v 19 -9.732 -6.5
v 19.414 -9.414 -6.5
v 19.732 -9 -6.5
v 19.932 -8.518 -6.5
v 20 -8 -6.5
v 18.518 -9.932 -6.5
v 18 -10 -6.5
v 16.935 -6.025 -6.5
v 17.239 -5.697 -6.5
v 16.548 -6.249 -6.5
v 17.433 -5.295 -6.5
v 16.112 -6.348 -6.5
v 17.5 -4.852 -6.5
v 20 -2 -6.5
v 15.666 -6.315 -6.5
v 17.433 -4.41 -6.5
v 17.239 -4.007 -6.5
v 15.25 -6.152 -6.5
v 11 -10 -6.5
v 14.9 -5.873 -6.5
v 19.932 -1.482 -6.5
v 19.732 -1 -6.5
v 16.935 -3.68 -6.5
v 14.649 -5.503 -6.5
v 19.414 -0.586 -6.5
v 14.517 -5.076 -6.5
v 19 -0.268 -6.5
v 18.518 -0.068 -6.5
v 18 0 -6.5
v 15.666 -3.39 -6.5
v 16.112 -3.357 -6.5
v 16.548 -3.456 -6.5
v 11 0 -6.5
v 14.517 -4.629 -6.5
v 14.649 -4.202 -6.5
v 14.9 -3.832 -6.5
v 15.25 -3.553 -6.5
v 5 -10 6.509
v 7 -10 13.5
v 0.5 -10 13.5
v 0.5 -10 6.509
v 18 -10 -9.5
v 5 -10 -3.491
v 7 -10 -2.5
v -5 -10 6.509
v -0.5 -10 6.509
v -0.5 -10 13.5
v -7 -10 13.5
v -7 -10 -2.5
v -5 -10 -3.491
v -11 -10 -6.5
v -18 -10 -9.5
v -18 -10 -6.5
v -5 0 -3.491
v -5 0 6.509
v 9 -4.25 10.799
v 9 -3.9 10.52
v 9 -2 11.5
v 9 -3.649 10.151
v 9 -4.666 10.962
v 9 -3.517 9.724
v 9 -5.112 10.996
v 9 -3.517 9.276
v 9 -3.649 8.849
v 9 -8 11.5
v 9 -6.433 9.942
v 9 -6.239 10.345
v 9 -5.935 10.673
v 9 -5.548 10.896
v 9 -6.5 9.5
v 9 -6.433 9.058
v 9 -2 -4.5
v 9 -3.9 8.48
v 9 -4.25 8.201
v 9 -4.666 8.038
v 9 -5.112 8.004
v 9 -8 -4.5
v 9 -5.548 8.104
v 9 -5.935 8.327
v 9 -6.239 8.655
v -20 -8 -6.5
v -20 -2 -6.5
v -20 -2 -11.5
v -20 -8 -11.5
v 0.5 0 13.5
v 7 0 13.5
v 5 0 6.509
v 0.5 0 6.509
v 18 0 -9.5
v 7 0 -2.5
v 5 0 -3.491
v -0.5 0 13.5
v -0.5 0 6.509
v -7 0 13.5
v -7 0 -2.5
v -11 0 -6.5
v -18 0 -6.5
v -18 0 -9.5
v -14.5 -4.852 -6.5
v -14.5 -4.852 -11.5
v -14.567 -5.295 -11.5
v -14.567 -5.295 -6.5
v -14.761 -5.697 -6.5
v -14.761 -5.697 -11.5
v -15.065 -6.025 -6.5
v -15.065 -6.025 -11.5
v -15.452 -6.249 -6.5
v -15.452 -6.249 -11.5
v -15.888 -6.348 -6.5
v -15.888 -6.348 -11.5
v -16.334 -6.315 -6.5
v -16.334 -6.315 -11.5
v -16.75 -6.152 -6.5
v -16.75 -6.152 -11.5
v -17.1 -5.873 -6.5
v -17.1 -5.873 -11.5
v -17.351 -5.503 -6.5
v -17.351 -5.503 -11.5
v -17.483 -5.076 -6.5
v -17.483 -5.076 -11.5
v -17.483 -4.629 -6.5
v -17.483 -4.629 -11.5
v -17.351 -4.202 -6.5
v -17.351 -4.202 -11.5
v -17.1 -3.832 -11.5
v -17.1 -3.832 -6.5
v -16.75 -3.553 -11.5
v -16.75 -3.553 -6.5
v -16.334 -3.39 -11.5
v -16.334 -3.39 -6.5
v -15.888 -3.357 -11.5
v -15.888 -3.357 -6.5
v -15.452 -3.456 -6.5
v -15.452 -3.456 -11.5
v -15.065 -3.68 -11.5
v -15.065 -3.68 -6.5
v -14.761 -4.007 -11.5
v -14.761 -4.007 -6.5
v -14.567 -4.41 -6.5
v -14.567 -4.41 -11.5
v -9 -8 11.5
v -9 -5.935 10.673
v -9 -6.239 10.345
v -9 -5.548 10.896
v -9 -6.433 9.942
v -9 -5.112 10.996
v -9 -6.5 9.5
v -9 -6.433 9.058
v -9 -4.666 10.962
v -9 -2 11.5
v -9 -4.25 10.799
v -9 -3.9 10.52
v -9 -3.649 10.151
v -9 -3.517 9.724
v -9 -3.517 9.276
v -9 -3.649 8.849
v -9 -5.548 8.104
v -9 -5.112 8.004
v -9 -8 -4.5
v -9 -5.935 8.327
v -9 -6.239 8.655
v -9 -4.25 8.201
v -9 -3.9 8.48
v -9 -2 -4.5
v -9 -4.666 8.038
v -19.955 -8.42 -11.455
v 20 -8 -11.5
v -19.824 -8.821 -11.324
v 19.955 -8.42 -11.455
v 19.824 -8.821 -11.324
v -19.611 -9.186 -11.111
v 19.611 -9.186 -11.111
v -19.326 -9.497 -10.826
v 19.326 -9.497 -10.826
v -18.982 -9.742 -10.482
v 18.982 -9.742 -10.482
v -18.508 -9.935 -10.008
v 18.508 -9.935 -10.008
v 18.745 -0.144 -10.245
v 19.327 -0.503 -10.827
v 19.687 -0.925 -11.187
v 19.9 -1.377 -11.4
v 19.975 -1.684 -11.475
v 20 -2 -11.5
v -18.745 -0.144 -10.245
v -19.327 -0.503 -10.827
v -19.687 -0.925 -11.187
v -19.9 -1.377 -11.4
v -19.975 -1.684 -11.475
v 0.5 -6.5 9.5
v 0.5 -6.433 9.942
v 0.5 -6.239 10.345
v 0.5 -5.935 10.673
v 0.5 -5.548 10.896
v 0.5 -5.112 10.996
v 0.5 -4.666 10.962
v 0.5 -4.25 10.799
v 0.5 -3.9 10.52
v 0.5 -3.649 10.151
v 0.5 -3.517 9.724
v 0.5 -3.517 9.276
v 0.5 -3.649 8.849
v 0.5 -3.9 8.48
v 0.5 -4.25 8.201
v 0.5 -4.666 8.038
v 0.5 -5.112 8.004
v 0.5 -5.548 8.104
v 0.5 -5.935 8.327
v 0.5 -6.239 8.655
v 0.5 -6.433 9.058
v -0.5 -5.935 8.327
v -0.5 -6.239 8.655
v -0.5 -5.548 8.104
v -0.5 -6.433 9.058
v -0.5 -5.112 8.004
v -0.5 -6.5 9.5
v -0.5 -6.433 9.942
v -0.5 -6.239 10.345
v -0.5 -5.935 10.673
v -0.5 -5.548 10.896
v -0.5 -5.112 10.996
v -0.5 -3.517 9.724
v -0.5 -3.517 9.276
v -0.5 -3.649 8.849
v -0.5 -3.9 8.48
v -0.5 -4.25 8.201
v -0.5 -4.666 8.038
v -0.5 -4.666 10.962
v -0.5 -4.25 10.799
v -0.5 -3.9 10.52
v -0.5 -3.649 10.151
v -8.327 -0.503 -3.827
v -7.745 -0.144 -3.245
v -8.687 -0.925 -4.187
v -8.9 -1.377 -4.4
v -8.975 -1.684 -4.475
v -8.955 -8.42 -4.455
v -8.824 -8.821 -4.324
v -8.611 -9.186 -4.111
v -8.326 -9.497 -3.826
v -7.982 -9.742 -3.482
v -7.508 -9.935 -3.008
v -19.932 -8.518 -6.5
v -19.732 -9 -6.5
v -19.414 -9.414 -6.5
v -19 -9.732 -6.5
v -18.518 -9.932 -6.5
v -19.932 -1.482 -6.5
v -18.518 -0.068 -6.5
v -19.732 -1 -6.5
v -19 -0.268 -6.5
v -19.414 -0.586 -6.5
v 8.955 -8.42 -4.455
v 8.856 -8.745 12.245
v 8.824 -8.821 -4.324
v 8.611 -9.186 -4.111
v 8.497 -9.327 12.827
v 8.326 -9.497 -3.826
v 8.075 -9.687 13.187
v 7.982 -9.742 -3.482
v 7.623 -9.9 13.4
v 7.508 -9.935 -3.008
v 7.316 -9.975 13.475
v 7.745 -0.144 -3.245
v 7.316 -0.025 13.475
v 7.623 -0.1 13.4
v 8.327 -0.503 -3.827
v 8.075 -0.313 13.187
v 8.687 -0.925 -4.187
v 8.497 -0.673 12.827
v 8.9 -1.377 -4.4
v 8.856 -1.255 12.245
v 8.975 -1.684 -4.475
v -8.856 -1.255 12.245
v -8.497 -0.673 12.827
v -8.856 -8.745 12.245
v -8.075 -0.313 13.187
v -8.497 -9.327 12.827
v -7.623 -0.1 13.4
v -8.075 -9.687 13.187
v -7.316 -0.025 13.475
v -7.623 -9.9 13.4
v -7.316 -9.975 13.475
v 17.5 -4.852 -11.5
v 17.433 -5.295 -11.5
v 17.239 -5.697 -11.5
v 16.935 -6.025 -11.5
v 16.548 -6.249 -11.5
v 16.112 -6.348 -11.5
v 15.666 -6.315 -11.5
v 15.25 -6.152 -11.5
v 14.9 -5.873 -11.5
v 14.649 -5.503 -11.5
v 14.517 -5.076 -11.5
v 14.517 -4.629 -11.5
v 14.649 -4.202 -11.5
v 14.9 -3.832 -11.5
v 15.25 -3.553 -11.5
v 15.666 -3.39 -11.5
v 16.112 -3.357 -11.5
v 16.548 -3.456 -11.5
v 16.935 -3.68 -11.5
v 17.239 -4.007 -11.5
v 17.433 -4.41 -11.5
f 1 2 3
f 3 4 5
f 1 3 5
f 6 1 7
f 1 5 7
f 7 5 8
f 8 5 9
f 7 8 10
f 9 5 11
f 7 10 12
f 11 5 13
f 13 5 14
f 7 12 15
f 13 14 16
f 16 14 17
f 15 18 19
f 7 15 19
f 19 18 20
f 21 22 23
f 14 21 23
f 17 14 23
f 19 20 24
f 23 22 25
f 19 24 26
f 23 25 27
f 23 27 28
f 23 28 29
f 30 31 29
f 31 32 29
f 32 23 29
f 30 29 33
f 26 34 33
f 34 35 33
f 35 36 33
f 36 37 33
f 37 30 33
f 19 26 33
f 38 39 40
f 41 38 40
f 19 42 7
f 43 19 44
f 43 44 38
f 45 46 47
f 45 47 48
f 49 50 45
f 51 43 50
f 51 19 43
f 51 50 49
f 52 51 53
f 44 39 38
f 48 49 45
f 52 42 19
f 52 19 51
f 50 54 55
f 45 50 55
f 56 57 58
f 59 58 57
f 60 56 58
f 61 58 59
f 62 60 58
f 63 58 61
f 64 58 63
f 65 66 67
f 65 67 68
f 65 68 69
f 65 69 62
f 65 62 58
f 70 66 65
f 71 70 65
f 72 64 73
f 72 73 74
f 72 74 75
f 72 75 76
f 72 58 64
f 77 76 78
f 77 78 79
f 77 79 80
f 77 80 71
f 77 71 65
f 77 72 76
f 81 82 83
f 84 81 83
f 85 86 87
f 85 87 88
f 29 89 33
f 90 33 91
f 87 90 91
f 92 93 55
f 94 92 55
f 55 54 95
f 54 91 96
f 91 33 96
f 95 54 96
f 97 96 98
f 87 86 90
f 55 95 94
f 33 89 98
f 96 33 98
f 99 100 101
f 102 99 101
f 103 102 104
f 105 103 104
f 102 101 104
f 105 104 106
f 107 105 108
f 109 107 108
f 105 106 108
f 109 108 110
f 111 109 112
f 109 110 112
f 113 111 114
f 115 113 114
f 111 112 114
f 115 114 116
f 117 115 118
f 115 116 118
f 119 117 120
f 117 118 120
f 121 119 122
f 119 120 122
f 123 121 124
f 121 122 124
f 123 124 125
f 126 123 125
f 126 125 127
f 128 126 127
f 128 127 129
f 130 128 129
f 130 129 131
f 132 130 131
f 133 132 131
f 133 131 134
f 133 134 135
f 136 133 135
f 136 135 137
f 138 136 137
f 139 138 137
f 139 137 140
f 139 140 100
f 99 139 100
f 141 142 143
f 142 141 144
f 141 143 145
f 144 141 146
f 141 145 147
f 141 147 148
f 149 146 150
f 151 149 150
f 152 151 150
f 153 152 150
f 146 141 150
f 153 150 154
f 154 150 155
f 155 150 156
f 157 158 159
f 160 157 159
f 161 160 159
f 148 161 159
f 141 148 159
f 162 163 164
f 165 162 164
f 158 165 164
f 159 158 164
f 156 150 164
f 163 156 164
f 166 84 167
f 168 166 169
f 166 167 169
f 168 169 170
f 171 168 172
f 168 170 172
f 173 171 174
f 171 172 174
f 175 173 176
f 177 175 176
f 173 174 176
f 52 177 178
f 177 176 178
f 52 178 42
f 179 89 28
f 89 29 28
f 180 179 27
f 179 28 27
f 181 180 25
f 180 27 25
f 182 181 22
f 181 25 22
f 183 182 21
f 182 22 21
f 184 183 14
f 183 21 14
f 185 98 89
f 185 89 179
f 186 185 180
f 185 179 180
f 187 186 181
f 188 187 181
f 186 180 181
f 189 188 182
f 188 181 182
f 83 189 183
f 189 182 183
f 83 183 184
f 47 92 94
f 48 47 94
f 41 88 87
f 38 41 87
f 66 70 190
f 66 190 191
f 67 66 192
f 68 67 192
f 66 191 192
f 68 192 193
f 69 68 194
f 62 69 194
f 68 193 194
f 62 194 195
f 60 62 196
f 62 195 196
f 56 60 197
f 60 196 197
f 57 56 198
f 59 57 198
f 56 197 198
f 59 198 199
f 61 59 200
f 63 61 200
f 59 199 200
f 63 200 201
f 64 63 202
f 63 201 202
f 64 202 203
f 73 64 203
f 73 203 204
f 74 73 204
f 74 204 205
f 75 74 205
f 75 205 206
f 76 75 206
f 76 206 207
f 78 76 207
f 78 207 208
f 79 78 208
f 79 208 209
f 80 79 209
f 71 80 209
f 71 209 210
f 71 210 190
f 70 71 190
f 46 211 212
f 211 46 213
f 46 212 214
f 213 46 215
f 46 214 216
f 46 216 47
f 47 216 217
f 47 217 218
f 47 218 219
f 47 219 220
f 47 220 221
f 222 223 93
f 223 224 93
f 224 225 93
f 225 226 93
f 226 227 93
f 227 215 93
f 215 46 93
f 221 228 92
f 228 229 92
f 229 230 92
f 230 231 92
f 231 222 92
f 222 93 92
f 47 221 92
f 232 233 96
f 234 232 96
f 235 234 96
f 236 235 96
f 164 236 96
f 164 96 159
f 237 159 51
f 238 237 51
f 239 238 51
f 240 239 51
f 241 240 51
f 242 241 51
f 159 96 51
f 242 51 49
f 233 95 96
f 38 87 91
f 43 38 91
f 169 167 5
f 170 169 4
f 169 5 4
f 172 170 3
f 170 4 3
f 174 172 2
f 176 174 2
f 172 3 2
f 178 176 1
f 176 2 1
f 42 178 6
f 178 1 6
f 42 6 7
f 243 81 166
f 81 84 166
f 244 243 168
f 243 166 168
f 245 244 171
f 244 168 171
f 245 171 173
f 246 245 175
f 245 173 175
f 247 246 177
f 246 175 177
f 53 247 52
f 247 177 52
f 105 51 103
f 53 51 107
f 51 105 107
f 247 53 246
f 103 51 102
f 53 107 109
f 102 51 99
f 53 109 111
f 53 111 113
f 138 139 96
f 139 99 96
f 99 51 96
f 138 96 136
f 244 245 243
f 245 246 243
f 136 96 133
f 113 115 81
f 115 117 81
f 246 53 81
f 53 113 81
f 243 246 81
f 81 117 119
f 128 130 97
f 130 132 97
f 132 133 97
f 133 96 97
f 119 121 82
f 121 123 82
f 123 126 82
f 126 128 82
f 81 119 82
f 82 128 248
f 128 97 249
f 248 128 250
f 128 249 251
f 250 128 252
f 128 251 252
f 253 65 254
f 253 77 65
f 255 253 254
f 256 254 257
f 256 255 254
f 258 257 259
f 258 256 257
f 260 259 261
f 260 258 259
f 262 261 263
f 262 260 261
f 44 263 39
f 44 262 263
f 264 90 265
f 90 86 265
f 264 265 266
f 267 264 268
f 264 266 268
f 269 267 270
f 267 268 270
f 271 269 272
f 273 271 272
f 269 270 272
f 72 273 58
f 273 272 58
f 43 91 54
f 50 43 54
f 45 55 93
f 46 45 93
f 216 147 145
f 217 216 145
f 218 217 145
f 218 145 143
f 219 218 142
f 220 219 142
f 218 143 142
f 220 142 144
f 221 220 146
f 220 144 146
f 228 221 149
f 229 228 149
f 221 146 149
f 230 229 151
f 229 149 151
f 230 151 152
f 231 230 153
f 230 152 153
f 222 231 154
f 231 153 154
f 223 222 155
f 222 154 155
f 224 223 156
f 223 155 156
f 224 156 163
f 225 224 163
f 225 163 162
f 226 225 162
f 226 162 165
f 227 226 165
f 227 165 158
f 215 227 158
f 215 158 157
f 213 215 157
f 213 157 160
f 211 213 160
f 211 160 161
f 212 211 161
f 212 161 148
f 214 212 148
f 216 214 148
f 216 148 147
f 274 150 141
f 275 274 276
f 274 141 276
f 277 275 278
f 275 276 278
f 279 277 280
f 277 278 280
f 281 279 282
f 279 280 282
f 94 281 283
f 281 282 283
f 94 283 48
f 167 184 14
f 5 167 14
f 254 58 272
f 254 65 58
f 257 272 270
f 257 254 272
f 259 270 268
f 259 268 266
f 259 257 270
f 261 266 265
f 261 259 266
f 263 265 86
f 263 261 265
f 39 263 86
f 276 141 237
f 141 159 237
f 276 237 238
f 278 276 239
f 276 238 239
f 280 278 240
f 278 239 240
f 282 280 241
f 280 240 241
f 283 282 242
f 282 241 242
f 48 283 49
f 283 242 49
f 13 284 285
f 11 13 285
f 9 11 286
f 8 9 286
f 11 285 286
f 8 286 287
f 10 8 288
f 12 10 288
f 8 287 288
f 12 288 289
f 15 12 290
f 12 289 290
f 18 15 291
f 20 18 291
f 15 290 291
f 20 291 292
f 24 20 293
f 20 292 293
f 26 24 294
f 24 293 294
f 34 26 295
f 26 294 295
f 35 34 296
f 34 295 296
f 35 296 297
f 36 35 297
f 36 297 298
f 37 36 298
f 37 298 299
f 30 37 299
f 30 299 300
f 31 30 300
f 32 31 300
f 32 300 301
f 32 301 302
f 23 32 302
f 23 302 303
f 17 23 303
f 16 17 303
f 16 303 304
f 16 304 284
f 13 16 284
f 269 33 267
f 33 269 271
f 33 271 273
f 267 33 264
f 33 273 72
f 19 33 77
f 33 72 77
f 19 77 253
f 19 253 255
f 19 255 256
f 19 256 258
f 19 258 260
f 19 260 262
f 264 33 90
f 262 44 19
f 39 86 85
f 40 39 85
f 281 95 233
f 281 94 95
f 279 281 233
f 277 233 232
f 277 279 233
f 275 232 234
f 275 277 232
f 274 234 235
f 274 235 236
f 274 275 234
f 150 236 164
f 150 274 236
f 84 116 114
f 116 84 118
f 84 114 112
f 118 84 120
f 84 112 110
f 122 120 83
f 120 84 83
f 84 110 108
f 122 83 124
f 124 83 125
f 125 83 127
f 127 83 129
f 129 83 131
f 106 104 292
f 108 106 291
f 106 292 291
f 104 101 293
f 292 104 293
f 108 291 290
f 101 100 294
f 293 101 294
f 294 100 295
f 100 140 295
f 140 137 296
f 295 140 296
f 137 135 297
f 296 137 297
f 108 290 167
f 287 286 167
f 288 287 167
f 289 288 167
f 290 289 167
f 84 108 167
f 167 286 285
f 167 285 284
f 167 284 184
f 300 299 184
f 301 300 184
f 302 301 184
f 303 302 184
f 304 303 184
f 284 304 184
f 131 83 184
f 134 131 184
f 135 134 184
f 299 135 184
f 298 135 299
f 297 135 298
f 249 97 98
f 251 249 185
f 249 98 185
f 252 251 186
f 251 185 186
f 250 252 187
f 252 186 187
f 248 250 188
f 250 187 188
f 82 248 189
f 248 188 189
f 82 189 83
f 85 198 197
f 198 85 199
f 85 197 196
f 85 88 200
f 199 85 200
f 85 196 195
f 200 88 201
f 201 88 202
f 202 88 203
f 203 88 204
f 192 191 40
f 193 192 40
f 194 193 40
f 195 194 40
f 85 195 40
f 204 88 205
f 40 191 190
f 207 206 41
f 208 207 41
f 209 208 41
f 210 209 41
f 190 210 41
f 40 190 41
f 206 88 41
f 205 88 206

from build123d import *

# Parameters (mm, degrees)
F1_DEPTH = 10
F2_R     = 1.5
F3_DEPTH = 10.5
F4_R     = 1.5
F5_DEPTH = 25
F6_DEPTH = 2
F7_SIZE  = 2
F8_SIZE  = 2
F9_R     = 2


with BuildPart() as f1:
    # F0 (on Front) → F1 (new body)
    with BuildSketch(Plane.XZ):
        Polygon((-20, -11.5), (20, -11.5), (20, -6.5), (9, -6.5), (9, 11.5), (0.5, 11.5), (0.5, 6.5086536296), (5, 6.5086536296), (5, -3.4913463704), (-5, -3.4913463704), (-5, 6.5086536296), (-0.5, 6.5086536296), (-0.5, 11.5), (-9, 11.5), (-9, -6.5), (-20, -6.5), align=None)
    extrude(amount=F1_DEPTH)

    # F2 (on face) → F3 (cut)
    with BuildSketch(Plane(origin=(0, 0, -11.5), x_dir=(1, 0, 0), z_dir=(0, 0, -1))):
        with Locations((16, 4.8524653539)):
            Circle(F2_R)
        with Locations((-16, 4.8524653539)):
            Circle(F2_R)
    extrude(amount=-F3_DEPTH, mode=Mode.SUBTRACT)

    # F4 (on face) → F5 (cut)
    with BuildSketch(Plane(origin=(-9, 0, 0), x_dir=(0, -1, 0), z_dir=(-1, 0, 0))):
        with Locations((5, 9.5)):
            Circle(F4_R)
    extrude(amount=-F5_DEPTH, mode=Mode.SUBTRACT)

    # F6 (add): faces of the model
    f6_faces = [f1.faces().sort_by_distance(p)[0] for p in [
        (4.75, -5, 11.5),
        (-4.75, -5, 11.5),
    ]]
    extrude(f6_faces, amount=F6_DEPTH)

    # F7
    f7_edges = [f1.edges().sort_by_distance(p)[0] for p in [
        (-9, -5, -6.5),
    ]]
    chamfer(f7_edges, length=F7_SIZE)

    # F8
    f8_edges = [f1.edges().sort_by_distance(p)[0] for p in [
        (9, -5, -6.5),
    ]]
    chamfer(f8_edges, length=F8_SIZE)

    # F9
    f9_edges = [f1.edges().sort_by_distance(p)[0] for p in [
        (-20, -10, -9),
        (-20, 0, -9),
        (20, 0, -9),
        (20, -10, -9),
        (9, -5, 13.5),
        (-9, -5, 13.5),
        (-9, -10, 4.5),
        (9, -10, 4.5),
        (9, 0, 4.5),
        (-9, 0, 4.5),
        (0, 0, -11.5),
        (0, -10, -11.5),
    ]]
    fillet(f9_edges, radius=F9_R)


solid = f1.part
